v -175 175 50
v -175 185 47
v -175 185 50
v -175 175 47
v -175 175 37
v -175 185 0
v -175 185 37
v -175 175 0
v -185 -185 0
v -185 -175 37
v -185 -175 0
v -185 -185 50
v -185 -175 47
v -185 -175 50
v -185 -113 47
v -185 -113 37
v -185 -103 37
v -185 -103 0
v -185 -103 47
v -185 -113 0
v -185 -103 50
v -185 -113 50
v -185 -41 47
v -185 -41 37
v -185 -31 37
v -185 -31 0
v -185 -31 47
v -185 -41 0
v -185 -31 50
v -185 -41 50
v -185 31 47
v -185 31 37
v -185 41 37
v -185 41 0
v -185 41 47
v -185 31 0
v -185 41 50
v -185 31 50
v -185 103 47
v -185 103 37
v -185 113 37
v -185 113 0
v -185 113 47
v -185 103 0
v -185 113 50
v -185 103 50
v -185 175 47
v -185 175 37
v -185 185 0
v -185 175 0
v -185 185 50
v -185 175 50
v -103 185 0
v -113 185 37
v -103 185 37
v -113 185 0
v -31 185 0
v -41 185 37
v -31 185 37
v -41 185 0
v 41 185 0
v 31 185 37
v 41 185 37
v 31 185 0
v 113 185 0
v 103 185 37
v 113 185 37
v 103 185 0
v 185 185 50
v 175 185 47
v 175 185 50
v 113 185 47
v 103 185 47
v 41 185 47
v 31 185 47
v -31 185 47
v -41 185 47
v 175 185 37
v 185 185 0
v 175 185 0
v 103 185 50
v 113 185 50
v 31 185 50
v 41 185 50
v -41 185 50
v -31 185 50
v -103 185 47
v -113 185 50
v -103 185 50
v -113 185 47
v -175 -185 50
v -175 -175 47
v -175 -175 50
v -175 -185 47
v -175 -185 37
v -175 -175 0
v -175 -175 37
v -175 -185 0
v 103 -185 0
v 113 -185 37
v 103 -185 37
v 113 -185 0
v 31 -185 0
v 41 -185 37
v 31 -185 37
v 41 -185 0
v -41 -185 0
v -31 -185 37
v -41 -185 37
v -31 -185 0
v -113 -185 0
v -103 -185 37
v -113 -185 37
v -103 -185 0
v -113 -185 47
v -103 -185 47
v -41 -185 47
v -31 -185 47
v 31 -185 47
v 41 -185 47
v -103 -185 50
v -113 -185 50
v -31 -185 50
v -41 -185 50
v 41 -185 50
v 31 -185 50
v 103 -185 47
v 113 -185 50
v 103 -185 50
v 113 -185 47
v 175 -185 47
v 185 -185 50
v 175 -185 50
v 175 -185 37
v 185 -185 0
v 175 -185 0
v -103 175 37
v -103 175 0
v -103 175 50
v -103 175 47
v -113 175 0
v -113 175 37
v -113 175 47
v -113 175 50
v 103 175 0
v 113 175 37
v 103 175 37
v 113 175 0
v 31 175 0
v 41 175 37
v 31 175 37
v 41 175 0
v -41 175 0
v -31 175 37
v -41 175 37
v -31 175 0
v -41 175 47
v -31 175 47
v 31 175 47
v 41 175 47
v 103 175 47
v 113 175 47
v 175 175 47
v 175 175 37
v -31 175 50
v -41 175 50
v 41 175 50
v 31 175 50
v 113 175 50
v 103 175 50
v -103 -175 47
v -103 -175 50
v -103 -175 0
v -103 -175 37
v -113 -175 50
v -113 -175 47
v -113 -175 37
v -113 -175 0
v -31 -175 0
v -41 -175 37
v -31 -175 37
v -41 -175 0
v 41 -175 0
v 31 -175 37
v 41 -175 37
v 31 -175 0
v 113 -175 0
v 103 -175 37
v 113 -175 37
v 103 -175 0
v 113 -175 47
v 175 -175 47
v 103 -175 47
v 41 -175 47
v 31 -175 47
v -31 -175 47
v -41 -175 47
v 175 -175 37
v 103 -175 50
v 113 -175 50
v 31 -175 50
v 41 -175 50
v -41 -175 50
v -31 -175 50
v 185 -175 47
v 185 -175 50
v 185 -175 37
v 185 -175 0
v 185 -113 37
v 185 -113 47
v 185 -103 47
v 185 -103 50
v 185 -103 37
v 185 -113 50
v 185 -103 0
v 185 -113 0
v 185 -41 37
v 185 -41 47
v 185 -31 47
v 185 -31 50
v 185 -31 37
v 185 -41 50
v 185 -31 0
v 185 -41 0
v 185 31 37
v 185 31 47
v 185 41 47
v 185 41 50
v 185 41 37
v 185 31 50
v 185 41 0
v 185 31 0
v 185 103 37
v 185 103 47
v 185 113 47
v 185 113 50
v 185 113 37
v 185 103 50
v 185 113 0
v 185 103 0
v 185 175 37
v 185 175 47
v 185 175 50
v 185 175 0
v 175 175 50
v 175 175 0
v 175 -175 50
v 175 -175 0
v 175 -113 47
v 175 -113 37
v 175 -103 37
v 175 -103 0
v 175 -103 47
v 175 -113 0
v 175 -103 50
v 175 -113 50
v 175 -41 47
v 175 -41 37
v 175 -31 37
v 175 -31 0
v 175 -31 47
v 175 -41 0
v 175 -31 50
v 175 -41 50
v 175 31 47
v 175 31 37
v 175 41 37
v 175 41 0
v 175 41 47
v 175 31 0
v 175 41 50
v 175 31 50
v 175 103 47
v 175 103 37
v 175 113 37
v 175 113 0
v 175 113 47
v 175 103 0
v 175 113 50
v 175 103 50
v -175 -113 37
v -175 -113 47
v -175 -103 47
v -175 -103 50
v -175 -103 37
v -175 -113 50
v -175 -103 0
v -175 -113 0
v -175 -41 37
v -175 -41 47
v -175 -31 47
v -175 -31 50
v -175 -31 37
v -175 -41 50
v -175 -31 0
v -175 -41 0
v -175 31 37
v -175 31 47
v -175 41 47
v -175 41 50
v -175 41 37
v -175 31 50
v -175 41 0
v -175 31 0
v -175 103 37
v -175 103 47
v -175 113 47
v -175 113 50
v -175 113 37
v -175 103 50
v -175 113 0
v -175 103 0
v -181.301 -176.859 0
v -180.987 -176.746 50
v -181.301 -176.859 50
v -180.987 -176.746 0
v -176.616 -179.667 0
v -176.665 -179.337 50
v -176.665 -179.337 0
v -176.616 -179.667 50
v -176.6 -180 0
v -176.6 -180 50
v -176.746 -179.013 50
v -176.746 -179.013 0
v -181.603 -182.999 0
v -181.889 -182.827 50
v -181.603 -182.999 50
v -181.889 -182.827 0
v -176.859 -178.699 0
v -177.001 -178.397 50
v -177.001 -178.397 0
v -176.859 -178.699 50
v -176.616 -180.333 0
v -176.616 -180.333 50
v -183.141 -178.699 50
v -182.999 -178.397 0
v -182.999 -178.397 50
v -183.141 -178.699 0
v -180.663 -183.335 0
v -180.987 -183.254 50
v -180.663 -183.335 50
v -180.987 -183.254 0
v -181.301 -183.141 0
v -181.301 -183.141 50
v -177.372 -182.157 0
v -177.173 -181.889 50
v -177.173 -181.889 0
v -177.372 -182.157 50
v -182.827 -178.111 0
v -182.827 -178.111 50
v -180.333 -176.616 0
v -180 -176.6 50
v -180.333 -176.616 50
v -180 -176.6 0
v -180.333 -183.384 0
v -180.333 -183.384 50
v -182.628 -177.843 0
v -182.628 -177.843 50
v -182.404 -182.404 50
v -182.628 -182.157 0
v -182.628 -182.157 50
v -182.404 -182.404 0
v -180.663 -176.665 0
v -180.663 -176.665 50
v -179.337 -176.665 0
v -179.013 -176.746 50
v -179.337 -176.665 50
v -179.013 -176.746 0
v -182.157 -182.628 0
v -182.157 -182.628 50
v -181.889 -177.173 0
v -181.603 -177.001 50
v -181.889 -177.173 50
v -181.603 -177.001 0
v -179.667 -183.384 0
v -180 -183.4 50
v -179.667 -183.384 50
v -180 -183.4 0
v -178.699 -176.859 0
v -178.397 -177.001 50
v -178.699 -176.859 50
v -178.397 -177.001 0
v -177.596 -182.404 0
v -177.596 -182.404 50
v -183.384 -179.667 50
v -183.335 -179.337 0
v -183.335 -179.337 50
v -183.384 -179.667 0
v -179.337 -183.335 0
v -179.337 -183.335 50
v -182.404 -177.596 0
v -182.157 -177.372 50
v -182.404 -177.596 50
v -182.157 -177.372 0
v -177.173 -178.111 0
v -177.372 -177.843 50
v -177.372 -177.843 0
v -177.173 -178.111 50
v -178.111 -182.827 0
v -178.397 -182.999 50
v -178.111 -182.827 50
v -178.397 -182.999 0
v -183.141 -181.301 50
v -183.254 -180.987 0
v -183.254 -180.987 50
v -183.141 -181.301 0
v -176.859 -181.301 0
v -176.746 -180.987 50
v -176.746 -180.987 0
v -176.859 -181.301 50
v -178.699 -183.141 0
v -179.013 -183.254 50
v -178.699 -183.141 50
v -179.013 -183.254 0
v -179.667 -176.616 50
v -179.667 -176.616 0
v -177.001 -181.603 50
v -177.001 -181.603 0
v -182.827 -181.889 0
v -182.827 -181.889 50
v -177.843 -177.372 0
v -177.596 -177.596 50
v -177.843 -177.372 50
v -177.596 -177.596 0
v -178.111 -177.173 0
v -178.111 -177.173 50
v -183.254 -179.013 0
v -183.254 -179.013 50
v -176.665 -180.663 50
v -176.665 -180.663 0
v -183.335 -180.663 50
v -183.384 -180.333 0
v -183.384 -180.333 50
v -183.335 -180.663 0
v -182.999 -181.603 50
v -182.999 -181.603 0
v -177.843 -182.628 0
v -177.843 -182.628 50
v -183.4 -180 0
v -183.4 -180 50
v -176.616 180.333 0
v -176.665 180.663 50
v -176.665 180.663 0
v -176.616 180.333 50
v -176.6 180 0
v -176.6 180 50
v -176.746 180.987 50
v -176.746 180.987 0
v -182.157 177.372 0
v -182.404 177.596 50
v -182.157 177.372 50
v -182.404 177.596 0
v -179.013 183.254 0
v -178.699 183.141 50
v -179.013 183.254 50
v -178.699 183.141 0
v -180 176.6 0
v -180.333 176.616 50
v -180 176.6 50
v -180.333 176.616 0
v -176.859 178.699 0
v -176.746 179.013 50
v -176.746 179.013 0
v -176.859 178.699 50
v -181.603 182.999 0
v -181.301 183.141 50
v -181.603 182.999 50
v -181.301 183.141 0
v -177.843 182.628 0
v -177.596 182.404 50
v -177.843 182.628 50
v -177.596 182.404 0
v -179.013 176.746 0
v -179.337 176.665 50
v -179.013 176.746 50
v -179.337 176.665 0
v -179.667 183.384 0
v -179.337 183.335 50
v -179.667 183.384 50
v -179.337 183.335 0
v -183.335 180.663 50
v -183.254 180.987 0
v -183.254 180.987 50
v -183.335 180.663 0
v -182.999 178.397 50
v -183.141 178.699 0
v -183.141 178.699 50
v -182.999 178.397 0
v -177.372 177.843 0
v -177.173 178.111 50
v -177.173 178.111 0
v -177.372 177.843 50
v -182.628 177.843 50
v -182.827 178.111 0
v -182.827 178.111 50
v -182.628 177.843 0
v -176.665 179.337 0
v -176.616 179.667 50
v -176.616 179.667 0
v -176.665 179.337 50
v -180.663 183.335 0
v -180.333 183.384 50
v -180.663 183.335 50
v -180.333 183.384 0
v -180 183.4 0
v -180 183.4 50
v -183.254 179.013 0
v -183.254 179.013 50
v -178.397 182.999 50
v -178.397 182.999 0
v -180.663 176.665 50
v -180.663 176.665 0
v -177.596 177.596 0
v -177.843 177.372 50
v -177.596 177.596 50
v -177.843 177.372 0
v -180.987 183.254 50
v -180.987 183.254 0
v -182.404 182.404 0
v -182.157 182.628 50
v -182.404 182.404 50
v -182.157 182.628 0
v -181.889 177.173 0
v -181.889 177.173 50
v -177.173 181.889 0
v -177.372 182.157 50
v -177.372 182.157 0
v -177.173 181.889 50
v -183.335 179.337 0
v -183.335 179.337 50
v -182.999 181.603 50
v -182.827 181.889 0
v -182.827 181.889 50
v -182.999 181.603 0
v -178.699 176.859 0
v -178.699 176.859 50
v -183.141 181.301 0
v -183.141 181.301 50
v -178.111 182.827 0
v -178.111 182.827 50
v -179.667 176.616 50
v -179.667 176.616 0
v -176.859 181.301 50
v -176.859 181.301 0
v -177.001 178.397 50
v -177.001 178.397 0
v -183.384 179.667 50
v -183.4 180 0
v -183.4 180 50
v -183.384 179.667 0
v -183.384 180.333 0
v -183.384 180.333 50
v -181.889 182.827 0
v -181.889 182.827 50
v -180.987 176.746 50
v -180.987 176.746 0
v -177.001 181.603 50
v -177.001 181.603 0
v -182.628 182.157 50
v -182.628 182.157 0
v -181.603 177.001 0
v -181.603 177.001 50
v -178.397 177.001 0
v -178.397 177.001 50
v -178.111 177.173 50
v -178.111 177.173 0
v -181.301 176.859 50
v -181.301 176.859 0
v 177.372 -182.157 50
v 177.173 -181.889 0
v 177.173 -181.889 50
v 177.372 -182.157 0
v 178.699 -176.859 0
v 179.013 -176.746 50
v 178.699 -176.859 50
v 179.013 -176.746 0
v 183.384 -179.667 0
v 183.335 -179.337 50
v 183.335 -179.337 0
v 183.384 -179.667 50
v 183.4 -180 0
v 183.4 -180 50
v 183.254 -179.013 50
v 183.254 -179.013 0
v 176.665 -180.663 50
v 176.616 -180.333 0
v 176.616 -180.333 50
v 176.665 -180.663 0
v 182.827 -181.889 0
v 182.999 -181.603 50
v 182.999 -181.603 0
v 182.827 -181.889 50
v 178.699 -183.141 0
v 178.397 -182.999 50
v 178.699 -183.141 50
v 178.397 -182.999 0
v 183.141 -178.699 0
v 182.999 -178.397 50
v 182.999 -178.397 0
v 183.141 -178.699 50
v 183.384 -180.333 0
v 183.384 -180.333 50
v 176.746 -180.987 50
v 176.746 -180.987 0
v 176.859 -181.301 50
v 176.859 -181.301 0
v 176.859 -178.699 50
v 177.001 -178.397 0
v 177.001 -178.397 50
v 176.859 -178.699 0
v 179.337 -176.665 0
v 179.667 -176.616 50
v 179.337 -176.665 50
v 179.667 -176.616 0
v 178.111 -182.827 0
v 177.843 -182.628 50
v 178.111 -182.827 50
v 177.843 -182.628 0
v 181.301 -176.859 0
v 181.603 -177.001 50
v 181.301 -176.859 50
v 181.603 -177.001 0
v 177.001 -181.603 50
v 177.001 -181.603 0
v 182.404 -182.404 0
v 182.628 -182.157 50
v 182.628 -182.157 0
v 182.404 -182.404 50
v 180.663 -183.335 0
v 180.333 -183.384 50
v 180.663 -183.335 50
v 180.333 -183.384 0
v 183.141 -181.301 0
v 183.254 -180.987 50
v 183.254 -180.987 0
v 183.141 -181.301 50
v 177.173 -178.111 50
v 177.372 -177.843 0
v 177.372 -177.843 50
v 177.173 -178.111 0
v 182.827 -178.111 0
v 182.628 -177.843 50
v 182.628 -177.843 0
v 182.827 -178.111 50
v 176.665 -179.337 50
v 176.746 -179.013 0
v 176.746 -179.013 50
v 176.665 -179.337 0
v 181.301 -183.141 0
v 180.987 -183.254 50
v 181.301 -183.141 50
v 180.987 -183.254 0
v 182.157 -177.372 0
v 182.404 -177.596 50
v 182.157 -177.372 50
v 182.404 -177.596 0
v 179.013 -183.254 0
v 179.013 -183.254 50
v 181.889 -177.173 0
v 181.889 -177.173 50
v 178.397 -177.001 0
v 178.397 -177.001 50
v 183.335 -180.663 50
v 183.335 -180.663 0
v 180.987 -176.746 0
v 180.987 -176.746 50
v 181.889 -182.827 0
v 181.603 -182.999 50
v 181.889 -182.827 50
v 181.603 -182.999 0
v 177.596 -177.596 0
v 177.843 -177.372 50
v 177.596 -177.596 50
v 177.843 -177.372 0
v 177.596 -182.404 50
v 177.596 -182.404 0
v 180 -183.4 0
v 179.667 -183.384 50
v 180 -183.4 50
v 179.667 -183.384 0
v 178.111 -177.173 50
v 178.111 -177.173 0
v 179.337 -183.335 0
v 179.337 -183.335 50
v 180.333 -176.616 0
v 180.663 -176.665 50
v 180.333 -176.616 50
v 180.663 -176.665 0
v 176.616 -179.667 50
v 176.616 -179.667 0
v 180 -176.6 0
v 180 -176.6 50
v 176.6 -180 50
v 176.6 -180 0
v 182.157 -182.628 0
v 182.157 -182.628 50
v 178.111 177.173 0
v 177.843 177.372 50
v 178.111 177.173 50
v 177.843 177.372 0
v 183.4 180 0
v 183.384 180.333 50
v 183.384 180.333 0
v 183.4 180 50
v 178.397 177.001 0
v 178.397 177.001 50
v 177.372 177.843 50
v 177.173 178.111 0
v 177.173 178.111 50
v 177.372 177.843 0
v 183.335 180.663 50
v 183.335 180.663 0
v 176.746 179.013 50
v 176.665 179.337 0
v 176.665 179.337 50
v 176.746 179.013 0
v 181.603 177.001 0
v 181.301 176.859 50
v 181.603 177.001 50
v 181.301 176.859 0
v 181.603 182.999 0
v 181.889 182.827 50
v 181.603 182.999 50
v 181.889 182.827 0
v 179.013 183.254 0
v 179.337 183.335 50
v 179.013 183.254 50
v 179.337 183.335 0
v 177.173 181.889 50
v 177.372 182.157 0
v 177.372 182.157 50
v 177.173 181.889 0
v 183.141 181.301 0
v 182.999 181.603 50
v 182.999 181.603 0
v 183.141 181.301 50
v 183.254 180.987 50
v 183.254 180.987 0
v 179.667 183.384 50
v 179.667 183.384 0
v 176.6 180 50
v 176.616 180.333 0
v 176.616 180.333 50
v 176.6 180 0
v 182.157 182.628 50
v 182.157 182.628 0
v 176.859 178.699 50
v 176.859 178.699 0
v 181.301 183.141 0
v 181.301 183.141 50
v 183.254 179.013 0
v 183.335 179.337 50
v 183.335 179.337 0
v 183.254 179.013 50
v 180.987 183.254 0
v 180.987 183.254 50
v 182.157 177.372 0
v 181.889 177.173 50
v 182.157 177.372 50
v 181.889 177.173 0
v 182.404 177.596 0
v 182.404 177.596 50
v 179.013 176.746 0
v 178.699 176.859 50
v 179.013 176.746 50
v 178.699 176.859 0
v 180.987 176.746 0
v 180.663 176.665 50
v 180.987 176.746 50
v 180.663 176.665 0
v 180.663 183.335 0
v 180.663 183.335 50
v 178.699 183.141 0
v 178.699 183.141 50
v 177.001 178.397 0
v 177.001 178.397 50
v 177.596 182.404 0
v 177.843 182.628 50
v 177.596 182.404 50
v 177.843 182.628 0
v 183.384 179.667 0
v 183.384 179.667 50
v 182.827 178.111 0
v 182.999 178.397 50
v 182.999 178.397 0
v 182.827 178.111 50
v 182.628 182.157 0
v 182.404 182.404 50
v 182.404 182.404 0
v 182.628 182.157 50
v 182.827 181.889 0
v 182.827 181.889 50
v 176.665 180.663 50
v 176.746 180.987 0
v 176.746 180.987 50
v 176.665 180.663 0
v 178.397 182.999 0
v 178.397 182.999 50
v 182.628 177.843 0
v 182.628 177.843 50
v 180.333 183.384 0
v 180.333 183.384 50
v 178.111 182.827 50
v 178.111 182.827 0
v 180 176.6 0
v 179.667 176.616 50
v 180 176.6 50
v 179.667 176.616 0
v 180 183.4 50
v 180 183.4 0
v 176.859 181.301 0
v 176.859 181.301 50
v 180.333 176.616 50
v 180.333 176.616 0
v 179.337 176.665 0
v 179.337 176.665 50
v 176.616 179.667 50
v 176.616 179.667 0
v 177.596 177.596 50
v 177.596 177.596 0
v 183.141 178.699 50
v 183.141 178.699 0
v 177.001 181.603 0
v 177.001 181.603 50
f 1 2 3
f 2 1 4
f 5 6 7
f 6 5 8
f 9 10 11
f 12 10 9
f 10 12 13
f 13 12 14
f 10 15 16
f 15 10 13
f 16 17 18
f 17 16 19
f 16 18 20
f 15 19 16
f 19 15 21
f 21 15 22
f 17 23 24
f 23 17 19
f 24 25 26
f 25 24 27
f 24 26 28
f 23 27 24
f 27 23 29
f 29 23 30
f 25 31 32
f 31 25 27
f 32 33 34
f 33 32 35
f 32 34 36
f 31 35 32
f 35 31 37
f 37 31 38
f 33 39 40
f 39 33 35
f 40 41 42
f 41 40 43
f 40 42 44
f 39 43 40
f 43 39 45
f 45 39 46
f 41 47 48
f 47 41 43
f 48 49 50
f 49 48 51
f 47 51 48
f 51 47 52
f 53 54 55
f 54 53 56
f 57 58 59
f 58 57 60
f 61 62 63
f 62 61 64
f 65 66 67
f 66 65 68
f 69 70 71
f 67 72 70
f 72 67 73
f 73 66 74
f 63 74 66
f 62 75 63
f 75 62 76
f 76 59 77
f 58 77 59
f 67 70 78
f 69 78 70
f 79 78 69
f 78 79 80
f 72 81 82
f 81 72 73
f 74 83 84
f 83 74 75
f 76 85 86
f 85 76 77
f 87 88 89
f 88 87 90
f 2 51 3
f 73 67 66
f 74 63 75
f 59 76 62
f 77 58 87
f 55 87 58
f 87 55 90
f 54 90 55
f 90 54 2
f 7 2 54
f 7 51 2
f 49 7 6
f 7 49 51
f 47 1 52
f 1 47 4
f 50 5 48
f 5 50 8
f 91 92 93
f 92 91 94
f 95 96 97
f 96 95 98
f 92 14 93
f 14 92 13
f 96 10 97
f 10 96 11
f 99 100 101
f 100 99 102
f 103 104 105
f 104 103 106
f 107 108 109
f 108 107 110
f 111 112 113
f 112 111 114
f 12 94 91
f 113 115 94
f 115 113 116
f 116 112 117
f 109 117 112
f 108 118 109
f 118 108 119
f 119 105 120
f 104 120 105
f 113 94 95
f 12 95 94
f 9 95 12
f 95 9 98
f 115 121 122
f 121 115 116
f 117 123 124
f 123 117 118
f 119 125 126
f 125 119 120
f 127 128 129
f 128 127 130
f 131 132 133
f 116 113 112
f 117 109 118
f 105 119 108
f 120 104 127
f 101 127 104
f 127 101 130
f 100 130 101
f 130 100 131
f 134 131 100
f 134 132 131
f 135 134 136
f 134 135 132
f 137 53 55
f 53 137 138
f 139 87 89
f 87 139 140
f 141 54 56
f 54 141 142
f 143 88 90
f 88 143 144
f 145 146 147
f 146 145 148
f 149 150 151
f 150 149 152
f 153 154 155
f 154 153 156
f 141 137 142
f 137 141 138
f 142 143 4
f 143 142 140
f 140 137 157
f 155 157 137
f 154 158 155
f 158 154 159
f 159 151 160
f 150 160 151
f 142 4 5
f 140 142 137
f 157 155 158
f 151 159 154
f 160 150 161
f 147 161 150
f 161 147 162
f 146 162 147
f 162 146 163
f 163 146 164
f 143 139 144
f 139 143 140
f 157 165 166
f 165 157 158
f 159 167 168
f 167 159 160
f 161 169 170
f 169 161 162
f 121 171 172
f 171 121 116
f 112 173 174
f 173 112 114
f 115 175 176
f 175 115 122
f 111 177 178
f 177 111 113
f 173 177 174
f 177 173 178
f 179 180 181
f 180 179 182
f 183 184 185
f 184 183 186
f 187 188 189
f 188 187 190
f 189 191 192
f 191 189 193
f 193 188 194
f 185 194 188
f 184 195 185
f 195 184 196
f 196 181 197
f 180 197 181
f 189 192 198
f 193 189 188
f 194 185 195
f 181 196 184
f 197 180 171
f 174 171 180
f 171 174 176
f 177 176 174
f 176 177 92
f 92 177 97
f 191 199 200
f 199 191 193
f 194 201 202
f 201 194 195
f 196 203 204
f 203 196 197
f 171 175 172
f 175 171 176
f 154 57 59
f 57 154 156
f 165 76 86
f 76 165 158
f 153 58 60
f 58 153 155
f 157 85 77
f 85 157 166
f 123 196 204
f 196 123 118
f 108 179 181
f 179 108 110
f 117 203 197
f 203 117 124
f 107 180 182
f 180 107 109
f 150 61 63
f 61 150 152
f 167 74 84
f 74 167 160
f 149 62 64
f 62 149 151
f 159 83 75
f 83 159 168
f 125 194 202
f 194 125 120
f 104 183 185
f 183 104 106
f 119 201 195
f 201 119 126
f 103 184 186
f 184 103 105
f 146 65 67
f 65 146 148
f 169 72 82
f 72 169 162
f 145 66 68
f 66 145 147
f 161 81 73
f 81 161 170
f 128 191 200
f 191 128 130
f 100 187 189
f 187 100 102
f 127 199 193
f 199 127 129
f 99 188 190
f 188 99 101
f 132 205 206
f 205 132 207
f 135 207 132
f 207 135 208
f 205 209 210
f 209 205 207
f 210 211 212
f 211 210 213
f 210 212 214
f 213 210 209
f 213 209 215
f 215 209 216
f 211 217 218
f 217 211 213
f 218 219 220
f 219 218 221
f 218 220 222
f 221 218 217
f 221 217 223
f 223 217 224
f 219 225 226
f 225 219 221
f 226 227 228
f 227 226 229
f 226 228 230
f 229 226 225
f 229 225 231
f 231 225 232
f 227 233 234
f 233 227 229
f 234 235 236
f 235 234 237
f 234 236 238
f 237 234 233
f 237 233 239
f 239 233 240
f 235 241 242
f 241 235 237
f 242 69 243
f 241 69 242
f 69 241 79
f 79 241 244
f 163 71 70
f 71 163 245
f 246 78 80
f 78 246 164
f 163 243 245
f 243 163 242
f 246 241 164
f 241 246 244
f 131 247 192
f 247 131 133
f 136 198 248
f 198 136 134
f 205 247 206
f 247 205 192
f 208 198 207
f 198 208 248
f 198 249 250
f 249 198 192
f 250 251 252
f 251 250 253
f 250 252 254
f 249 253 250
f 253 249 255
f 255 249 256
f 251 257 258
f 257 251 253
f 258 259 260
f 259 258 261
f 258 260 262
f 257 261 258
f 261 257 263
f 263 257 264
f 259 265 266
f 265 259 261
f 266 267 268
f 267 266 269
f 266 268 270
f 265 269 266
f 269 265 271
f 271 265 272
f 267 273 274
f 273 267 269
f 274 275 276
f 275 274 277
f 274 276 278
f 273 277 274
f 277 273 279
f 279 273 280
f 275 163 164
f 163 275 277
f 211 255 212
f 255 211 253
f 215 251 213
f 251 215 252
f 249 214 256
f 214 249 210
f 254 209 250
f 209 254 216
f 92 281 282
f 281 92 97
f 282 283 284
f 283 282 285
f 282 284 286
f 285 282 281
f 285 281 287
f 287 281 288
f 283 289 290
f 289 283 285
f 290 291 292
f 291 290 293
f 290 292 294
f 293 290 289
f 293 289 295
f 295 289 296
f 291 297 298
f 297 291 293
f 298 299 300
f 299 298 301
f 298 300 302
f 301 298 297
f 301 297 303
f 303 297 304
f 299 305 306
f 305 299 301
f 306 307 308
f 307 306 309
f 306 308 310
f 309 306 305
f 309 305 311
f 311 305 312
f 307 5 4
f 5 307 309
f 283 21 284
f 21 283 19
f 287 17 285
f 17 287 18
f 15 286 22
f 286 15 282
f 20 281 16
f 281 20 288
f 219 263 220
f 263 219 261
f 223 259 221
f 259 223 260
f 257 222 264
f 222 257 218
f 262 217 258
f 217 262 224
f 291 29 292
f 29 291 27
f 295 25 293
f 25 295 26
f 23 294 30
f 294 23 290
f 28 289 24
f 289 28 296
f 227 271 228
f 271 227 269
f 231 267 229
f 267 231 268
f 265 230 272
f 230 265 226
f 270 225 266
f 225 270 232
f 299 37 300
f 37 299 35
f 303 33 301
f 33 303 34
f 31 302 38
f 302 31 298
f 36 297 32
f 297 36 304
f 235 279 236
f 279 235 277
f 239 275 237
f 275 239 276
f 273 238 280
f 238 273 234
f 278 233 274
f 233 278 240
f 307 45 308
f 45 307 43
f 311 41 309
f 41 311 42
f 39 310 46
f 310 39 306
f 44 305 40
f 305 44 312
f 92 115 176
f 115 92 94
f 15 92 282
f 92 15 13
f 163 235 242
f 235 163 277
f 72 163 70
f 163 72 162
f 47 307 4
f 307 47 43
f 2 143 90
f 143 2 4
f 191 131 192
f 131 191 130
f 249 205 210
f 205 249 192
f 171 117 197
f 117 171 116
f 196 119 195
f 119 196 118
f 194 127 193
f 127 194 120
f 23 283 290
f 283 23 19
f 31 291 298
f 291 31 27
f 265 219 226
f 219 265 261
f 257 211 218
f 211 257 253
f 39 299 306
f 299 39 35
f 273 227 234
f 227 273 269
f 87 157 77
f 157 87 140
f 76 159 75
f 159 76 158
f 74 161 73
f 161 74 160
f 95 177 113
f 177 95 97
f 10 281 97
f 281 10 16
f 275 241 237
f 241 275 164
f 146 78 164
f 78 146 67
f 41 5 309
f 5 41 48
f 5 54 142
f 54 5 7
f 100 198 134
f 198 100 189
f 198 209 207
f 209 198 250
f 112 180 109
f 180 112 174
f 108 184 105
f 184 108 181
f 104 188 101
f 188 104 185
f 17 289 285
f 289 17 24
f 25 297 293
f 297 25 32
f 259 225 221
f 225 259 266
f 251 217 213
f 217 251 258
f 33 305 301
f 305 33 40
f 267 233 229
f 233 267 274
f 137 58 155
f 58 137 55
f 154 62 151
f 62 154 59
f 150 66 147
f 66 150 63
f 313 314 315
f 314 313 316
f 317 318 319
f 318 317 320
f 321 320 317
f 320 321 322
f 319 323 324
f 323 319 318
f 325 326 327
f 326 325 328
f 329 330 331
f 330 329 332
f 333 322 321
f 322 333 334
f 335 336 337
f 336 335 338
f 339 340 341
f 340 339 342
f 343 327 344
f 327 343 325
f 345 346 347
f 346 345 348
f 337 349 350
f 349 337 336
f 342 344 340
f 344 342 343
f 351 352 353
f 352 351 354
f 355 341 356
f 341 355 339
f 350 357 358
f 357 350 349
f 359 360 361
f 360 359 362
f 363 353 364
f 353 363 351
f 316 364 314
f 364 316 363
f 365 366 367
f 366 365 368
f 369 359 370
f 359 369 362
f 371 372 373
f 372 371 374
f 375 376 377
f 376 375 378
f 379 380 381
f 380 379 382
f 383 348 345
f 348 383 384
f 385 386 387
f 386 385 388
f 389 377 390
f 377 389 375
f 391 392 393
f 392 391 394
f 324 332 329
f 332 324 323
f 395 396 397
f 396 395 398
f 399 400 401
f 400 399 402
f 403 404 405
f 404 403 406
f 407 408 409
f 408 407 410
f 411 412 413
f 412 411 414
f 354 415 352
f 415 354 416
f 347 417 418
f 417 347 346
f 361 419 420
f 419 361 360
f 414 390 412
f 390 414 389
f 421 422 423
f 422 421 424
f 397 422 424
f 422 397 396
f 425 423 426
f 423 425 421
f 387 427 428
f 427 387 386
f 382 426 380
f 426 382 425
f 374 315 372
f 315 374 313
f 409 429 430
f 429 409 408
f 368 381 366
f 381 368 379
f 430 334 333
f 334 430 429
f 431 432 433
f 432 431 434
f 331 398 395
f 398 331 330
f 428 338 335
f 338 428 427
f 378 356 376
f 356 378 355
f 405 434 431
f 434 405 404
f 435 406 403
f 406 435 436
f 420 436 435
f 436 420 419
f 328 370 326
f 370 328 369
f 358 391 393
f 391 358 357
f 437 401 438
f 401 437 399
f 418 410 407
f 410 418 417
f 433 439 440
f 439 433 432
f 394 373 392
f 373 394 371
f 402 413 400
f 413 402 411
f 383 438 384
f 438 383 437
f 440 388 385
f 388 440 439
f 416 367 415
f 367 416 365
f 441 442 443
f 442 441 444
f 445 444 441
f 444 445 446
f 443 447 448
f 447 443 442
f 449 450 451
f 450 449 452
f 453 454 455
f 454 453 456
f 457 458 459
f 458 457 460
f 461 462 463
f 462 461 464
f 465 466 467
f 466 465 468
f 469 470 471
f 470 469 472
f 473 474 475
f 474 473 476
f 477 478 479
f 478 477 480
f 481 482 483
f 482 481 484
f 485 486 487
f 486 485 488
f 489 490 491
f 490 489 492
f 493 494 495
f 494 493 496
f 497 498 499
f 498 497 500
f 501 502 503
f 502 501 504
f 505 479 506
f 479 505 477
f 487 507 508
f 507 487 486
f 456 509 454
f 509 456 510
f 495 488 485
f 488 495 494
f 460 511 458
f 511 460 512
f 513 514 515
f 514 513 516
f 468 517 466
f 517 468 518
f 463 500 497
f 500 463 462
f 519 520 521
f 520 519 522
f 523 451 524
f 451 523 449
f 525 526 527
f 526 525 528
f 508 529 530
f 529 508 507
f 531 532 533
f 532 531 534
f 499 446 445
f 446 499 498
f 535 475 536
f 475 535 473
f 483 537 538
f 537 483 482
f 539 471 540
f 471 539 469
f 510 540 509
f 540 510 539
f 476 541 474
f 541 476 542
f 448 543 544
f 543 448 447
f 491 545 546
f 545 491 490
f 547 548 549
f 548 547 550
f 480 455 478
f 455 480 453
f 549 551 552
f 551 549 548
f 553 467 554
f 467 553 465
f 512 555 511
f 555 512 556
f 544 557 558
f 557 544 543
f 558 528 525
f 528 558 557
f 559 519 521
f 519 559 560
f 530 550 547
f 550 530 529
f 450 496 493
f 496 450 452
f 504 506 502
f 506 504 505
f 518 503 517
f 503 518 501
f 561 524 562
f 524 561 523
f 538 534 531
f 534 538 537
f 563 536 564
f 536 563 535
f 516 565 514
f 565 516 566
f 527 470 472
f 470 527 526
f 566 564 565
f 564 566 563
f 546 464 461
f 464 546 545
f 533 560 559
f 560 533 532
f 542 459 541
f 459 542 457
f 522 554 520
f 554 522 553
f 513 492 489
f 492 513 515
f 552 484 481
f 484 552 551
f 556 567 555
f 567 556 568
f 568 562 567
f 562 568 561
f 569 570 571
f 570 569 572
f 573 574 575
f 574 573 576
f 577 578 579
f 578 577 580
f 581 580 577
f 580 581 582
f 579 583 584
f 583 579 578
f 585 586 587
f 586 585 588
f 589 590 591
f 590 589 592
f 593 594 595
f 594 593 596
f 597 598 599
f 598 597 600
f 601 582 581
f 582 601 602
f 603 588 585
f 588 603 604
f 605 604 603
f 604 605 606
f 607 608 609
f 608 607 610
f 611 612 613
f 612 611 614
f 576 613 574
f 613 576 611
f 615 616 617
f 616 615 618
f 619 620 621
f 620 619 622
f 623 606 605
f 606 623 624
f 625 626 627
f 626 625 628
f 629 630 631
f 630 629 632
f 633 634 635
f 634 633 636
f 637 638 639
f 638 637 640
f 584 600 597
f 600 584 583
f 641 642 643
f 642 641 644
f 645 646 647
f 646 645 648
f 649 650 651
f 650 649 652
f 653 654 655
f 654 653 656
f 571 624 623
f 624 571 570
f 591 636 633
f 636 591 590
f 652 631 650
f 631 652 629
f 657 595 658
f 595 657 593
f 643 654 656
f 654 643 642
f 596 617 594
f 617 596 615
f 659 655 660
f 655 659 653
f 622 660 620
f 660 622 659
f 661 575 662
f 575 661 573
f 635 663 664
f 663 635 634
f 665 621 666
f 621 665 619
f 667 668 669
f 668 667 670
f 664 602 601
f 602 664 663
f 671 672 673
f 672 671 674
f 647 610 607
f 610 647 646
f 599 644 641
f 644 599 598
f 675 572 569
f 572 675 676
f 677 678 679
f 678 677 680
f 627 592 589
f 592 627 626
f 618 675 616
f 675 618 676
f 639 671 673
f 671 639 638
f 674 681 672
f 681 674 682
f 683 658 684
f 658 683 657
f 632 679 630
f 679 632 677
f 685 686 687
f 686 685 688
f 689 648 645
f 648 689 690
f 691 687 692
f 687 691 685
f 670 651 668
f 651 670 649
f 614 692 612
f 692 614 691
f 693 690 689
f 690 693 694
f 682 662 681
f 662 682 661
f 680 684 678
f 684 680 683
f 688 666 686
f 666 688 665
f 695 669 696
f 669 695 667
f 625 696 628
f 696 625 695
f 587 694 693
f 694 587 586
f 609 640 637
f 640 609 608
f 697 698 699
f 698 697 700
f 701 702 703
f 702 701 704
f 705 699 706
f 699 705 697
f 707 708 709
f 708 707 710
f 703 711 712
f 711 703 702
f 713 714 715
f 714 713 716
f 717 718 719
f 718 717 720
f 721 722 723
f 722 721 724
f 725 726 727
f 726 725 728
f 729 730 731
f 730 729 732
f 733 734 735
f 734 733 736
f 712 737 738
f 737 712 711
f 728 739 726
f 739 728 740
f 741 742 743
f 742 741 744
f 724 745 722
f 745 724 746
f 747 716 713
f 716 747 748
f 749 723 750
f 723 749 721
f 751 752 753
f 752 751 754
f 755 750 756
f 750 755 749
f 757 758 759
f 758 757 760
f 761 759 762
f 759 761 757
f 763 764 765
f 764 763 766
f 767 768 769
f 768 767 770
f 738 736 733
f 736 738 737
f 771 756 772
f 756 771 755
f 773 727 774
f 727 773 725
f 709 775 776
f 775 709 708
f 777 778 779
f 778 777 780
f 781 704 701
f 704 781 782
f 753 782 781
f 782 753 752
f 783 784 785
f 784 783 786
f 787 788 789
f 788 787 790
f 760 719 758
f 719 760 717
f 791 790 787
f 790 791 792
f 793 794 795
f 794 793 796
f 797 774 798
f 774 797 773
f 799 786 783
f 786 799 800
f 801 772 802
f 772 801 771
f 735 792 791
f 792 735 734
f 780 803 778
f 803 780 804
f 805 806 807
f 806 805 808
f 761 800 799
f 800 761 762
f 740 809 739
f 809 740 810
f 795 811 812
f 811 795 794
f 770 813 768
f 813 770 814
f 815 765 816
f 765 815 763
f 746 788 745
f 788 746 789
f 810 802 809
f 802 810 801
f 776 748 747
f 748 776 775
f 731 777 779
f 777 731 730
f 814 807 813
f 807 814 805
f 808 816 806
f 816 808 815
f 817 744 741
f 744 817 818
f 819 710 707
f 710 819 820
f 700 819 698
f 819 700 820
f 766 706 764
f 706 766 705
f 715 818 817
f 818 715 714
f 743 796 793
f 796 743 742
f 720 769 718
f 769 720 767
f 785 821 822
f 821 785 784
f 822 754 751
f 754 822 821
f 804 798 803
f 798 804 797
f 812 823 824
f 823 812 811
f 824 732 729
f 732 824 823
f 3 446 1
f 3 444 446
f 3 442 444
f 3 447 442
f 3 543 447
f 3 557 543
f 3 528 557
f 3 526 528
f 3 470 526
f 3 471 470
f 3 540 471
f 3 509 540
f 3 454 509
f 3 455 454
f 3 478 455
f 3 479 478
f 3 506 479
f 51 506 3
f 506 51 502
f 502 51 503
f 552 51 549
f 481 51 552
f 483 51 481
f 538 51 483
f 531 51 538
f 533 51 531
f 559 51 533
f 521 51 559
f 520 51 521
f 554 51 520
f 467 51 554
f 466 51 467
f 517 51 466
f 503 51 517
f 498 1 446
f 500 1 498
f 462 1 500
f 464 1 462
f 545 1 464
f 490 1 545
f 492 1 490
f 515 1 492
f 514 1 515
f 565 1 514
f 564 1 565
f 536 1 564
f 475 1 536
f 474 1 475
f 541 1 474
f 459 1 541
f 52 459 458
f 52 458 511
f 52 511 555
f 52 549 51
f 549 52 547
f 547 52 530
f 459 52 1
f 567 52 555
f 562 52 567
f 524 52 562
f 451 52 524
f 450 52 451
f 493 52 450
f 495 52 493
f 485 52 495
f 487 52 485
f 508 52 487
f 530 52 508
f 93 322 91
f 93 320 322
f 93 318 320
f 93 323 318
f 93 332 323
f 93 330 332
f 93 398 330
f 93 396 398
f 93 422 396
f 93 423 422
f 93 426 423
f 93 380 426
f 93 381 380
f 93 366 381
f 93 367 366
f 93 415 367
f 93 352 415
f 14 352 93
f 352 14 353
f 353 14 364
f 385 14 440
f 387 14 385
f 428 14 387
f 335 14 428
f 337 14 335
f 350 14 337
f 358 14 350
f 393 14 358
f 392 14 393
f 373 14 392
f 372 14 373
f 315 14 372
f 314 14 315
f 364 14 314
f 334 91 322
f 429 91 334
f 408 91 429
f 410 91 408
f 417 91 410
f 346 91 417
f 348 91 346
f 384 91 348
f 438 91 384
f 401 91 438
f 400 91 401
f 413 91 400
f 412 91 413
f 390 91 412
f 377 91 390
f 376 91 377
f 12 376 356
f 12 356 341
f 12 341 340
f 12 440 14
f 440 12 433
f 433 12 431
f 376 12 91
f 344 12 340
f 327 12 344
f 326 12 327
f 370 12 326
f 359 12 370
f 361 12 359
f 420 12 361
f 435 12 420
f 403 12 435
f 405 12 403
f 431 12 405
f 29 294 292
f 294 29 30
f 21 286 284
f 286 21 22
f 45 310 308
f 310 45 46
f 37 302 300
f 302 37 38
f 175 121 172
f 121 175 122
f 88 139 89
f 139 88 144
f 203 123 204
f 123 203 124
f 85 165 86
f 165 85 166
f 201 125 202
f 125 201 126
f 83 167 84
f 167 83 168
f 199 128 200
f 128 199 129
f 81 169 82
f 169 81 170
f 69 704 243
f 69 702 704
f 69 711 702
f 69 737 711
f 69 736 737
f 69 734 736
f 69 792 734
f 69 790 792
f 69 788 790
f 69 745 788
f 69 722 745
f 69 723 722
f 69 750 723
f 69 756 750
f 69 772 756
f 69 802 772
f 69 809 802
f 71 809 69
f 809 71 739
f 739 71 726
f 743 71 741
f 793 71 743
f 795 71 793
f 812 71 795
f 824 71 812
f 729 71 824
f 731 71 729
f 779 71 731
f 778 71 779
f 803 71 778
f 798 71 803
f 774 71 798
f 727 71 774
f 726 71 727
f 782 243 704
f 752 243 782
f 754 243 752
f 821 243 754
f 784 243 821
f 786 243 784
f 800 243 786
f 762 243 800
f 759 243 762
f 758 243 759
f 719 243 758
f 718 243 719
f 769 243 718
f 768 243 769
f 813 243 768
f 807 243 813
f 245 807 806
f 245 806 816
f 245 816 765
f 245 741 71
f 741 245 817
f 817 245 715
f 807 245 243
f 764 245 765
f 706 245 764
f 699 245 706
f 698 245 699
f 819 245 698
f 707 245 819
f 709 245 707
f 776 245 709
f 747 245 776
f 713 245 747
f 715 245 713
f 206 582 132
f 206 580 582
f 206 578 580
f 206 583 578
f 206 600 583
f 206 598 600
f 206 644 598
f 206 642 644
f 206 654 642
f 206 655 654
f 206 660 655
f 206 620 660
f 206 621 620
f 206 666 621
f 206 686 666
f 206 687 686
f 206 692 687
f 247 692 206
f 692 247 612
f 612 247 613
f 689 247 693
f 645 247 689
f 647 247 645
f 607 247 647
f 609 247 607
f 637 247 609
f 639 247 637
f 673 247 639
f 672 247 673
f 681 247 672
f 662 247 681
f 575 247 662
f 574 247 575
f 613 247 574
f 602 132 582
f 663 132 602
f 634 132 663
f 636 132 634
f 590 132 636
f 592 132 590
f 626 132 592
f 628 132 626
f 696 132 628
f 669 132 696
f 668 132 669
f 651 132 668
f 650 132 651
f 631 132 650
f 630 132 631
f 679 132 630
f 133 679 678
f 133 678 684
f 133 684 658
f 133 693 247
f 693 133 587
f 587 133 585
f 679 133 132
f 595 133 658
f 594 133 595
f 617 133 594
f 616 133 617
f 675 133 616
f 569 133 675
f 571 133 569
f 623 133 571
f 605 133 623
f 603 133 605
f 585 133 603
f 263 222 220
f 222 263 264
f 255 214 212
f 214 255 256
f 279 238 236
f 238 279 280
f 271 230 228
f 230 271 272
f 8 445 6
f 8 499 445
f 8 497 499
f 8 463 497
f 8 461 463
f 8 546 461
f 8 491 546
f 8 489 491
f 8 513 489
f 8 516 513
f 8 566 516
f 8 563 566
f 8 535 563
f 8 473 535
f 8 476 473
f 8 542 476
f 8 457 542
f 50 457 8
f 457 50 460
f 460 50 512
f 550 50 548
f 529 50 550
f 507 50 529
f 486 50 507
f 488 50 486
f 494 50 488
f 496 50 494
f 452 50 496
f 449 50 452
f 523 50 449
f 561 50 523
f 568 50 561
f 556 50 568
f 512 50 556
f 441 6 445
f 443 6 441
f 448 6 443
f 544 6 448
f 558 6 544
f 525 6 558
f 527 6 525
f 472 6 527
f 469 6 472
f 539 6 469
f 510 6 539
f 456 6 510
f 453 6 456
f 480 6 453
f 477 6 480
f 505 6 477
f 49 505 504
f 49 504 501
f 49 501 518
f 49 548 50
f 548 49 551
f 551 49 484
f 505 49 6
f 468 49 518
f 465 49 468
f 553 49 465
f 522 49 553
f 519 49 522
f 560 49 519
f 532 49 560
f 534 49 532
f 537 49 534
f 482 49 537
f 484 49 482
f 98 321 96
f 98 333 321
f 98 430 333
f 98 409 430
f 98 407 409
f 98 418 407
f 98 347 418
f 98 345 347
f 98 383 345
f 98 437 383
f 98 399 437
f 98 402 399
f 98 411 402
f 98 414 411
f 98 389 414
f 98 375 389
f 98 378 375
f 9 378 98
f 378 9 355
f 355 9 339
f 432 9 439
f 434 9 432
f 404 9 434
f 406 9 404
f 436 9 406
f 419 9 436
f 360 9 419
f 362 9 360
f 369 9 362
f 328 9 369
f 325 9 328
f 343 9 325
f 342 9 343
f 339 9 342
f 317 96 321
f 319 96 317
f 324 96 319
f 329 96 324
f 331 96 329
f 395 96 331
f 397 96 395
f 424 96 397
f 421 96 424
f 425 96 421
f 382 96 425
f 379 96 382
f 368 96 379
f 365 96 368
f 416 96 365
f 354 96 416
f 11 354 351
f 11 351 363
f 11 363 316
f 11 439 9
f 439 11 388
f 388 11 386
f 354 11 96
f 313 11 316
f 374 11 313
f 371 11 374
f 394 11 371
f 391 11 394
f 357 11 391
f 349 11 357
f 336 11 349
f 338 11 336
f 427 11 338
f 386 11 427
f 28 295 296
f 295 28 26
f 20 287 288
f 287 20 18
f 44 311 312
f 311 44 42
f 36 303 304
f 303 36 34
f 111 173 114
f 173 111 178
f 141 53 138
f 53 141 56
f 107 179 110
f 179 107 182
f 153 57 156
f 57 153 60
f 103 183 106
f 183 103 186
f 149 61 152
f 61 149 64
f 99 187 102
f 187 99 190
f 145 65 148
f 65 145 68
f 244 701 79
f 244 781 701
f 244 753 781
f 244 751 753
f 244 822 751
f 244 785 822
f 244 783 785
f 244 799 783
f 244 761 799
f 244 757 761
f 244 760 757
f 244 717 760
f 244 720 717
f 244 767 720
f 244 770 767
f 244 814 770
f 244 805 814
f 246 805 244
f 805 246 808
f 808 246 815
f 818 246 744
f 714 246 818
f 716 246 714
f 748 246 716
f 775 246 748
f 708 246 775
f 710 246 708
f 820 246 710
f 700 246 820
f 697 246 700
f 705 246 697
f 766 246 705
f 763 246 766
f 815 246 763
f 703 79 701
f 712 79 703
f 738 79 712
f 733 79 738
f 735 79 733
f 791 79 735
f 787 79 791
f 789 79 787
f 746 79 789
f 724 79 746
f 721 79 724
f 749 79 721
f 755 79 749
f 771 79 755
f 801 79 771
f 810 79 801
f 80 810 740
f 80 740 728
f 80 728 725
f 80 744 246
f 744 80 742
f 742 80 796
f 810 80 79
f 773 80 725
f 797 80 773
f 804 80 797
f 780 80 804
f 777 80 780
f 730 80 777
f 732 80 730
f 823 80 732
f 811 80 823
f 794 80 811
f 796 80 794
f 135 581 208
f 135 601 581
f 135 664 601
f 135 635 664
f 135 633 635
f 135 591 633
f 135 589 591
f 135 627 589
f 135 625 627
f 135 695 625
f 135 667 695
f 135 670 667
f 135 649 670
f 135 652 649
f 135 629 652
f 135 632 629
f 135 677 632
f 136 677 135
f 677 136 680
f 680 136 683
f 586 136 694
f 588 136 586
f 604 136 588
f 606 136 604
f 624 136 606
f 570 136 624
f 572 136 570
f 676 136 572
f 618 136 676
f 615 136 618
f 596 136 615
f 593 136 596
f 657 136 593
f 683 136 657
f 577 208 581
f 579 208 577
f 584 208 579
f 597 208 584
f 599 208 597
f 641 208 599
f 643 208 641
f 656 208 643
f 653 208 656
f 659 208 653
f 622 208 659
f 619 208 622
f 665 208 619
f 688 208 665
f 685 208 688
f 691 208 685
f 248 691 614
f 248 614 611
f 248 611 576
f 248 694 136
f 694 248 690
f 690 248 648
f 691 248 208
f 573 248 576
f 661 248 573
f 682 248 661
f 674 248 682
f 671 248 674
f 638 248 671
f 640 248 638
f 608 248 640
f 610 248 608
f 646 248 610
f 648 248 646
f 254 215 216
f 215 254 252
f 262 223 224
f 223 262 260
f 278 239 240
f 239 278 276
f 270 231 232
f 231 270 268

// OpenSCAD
// Cage slice part (z0..z1). Units: mm.
// Print orientation: normal

bar=10;
inner=[350,350,700];
gap_xy=62;
gap_z=61;
hole_d=6.8;
$fn=64;

outer=[inner[0]+2*bar, inner[1]+2*bar, inner[2]+2*bar];
half=[outer[0]/2, outer[1]/2, outer[2]/2];

pitch_xy=bar+gap_xy;
pitch_z=bar+gap_z;

centers=[for(i=[0:5]) -(half[0]-bar/2) + i*pitch_xy];
z_levels=[for(i=[0:10]) i*pitch_z];

module vbar(xc,yc){ translate([xc-bar/2,yc-bar/2,0]) cube([bar,bar,outer[2]],center=false); }
module hbar_x(yc,z0){ translate([-half[0],yc-bar/2,z0]) cube([outer[0],bar,bar],center=false); }
module hbar_y(xc,z0){ translate([xc-bar/2,-half[1],z0]) cube([bar,outer[1],bar],center=false); }

module grid(z0){ union(){ for(yc=centers) hbar_x(yc,z0); for(xc=centers) hbar_y(xc,z0); } }

module side_verticals(){
  union(){
    for(xc=centers){ vbar(xc, half[1]-bar/2); vbar(xc,-half[1]+bar/2); }
    for(yc=centers){ vbar( half[0]-bar/2,yc); vbar(-half[0]+bar/2,yc); }
  }
}

module side_rings(){
  union(){
    for(z0=z_levels){
      hbar_x( half[1]-bar/2,z0); hbar_x(-half[1]+bar/2,z0);
      hbar_y( half[0]-bar/2,z0); hbar_y(-half[0]+bar/2,z0);
    }
  }
}

module rod_holes(){
  for(sx=[-1,1],sy=[-1,1]) translate([sx*(half[0]-bar/2), sy*(half[1]-bar/2), -1]) cylinder(d=hole_d,h=outer[2]+2,center=false);
}

module cage(){ difference(){ union(){ side_verticals(); side_rings(); grid(0); grid(outer[2]-bar); } rod_holes(); } }

module cage_slice(zmin,zmax){ intersection(){ cage(); translate([-1000,-1000,zmin]) cube([2000,2000,zmax-zmin],center=false); } }

z0=247; z1=297;
translate([0,0,-z0]) cage_slice(z0,z1);
